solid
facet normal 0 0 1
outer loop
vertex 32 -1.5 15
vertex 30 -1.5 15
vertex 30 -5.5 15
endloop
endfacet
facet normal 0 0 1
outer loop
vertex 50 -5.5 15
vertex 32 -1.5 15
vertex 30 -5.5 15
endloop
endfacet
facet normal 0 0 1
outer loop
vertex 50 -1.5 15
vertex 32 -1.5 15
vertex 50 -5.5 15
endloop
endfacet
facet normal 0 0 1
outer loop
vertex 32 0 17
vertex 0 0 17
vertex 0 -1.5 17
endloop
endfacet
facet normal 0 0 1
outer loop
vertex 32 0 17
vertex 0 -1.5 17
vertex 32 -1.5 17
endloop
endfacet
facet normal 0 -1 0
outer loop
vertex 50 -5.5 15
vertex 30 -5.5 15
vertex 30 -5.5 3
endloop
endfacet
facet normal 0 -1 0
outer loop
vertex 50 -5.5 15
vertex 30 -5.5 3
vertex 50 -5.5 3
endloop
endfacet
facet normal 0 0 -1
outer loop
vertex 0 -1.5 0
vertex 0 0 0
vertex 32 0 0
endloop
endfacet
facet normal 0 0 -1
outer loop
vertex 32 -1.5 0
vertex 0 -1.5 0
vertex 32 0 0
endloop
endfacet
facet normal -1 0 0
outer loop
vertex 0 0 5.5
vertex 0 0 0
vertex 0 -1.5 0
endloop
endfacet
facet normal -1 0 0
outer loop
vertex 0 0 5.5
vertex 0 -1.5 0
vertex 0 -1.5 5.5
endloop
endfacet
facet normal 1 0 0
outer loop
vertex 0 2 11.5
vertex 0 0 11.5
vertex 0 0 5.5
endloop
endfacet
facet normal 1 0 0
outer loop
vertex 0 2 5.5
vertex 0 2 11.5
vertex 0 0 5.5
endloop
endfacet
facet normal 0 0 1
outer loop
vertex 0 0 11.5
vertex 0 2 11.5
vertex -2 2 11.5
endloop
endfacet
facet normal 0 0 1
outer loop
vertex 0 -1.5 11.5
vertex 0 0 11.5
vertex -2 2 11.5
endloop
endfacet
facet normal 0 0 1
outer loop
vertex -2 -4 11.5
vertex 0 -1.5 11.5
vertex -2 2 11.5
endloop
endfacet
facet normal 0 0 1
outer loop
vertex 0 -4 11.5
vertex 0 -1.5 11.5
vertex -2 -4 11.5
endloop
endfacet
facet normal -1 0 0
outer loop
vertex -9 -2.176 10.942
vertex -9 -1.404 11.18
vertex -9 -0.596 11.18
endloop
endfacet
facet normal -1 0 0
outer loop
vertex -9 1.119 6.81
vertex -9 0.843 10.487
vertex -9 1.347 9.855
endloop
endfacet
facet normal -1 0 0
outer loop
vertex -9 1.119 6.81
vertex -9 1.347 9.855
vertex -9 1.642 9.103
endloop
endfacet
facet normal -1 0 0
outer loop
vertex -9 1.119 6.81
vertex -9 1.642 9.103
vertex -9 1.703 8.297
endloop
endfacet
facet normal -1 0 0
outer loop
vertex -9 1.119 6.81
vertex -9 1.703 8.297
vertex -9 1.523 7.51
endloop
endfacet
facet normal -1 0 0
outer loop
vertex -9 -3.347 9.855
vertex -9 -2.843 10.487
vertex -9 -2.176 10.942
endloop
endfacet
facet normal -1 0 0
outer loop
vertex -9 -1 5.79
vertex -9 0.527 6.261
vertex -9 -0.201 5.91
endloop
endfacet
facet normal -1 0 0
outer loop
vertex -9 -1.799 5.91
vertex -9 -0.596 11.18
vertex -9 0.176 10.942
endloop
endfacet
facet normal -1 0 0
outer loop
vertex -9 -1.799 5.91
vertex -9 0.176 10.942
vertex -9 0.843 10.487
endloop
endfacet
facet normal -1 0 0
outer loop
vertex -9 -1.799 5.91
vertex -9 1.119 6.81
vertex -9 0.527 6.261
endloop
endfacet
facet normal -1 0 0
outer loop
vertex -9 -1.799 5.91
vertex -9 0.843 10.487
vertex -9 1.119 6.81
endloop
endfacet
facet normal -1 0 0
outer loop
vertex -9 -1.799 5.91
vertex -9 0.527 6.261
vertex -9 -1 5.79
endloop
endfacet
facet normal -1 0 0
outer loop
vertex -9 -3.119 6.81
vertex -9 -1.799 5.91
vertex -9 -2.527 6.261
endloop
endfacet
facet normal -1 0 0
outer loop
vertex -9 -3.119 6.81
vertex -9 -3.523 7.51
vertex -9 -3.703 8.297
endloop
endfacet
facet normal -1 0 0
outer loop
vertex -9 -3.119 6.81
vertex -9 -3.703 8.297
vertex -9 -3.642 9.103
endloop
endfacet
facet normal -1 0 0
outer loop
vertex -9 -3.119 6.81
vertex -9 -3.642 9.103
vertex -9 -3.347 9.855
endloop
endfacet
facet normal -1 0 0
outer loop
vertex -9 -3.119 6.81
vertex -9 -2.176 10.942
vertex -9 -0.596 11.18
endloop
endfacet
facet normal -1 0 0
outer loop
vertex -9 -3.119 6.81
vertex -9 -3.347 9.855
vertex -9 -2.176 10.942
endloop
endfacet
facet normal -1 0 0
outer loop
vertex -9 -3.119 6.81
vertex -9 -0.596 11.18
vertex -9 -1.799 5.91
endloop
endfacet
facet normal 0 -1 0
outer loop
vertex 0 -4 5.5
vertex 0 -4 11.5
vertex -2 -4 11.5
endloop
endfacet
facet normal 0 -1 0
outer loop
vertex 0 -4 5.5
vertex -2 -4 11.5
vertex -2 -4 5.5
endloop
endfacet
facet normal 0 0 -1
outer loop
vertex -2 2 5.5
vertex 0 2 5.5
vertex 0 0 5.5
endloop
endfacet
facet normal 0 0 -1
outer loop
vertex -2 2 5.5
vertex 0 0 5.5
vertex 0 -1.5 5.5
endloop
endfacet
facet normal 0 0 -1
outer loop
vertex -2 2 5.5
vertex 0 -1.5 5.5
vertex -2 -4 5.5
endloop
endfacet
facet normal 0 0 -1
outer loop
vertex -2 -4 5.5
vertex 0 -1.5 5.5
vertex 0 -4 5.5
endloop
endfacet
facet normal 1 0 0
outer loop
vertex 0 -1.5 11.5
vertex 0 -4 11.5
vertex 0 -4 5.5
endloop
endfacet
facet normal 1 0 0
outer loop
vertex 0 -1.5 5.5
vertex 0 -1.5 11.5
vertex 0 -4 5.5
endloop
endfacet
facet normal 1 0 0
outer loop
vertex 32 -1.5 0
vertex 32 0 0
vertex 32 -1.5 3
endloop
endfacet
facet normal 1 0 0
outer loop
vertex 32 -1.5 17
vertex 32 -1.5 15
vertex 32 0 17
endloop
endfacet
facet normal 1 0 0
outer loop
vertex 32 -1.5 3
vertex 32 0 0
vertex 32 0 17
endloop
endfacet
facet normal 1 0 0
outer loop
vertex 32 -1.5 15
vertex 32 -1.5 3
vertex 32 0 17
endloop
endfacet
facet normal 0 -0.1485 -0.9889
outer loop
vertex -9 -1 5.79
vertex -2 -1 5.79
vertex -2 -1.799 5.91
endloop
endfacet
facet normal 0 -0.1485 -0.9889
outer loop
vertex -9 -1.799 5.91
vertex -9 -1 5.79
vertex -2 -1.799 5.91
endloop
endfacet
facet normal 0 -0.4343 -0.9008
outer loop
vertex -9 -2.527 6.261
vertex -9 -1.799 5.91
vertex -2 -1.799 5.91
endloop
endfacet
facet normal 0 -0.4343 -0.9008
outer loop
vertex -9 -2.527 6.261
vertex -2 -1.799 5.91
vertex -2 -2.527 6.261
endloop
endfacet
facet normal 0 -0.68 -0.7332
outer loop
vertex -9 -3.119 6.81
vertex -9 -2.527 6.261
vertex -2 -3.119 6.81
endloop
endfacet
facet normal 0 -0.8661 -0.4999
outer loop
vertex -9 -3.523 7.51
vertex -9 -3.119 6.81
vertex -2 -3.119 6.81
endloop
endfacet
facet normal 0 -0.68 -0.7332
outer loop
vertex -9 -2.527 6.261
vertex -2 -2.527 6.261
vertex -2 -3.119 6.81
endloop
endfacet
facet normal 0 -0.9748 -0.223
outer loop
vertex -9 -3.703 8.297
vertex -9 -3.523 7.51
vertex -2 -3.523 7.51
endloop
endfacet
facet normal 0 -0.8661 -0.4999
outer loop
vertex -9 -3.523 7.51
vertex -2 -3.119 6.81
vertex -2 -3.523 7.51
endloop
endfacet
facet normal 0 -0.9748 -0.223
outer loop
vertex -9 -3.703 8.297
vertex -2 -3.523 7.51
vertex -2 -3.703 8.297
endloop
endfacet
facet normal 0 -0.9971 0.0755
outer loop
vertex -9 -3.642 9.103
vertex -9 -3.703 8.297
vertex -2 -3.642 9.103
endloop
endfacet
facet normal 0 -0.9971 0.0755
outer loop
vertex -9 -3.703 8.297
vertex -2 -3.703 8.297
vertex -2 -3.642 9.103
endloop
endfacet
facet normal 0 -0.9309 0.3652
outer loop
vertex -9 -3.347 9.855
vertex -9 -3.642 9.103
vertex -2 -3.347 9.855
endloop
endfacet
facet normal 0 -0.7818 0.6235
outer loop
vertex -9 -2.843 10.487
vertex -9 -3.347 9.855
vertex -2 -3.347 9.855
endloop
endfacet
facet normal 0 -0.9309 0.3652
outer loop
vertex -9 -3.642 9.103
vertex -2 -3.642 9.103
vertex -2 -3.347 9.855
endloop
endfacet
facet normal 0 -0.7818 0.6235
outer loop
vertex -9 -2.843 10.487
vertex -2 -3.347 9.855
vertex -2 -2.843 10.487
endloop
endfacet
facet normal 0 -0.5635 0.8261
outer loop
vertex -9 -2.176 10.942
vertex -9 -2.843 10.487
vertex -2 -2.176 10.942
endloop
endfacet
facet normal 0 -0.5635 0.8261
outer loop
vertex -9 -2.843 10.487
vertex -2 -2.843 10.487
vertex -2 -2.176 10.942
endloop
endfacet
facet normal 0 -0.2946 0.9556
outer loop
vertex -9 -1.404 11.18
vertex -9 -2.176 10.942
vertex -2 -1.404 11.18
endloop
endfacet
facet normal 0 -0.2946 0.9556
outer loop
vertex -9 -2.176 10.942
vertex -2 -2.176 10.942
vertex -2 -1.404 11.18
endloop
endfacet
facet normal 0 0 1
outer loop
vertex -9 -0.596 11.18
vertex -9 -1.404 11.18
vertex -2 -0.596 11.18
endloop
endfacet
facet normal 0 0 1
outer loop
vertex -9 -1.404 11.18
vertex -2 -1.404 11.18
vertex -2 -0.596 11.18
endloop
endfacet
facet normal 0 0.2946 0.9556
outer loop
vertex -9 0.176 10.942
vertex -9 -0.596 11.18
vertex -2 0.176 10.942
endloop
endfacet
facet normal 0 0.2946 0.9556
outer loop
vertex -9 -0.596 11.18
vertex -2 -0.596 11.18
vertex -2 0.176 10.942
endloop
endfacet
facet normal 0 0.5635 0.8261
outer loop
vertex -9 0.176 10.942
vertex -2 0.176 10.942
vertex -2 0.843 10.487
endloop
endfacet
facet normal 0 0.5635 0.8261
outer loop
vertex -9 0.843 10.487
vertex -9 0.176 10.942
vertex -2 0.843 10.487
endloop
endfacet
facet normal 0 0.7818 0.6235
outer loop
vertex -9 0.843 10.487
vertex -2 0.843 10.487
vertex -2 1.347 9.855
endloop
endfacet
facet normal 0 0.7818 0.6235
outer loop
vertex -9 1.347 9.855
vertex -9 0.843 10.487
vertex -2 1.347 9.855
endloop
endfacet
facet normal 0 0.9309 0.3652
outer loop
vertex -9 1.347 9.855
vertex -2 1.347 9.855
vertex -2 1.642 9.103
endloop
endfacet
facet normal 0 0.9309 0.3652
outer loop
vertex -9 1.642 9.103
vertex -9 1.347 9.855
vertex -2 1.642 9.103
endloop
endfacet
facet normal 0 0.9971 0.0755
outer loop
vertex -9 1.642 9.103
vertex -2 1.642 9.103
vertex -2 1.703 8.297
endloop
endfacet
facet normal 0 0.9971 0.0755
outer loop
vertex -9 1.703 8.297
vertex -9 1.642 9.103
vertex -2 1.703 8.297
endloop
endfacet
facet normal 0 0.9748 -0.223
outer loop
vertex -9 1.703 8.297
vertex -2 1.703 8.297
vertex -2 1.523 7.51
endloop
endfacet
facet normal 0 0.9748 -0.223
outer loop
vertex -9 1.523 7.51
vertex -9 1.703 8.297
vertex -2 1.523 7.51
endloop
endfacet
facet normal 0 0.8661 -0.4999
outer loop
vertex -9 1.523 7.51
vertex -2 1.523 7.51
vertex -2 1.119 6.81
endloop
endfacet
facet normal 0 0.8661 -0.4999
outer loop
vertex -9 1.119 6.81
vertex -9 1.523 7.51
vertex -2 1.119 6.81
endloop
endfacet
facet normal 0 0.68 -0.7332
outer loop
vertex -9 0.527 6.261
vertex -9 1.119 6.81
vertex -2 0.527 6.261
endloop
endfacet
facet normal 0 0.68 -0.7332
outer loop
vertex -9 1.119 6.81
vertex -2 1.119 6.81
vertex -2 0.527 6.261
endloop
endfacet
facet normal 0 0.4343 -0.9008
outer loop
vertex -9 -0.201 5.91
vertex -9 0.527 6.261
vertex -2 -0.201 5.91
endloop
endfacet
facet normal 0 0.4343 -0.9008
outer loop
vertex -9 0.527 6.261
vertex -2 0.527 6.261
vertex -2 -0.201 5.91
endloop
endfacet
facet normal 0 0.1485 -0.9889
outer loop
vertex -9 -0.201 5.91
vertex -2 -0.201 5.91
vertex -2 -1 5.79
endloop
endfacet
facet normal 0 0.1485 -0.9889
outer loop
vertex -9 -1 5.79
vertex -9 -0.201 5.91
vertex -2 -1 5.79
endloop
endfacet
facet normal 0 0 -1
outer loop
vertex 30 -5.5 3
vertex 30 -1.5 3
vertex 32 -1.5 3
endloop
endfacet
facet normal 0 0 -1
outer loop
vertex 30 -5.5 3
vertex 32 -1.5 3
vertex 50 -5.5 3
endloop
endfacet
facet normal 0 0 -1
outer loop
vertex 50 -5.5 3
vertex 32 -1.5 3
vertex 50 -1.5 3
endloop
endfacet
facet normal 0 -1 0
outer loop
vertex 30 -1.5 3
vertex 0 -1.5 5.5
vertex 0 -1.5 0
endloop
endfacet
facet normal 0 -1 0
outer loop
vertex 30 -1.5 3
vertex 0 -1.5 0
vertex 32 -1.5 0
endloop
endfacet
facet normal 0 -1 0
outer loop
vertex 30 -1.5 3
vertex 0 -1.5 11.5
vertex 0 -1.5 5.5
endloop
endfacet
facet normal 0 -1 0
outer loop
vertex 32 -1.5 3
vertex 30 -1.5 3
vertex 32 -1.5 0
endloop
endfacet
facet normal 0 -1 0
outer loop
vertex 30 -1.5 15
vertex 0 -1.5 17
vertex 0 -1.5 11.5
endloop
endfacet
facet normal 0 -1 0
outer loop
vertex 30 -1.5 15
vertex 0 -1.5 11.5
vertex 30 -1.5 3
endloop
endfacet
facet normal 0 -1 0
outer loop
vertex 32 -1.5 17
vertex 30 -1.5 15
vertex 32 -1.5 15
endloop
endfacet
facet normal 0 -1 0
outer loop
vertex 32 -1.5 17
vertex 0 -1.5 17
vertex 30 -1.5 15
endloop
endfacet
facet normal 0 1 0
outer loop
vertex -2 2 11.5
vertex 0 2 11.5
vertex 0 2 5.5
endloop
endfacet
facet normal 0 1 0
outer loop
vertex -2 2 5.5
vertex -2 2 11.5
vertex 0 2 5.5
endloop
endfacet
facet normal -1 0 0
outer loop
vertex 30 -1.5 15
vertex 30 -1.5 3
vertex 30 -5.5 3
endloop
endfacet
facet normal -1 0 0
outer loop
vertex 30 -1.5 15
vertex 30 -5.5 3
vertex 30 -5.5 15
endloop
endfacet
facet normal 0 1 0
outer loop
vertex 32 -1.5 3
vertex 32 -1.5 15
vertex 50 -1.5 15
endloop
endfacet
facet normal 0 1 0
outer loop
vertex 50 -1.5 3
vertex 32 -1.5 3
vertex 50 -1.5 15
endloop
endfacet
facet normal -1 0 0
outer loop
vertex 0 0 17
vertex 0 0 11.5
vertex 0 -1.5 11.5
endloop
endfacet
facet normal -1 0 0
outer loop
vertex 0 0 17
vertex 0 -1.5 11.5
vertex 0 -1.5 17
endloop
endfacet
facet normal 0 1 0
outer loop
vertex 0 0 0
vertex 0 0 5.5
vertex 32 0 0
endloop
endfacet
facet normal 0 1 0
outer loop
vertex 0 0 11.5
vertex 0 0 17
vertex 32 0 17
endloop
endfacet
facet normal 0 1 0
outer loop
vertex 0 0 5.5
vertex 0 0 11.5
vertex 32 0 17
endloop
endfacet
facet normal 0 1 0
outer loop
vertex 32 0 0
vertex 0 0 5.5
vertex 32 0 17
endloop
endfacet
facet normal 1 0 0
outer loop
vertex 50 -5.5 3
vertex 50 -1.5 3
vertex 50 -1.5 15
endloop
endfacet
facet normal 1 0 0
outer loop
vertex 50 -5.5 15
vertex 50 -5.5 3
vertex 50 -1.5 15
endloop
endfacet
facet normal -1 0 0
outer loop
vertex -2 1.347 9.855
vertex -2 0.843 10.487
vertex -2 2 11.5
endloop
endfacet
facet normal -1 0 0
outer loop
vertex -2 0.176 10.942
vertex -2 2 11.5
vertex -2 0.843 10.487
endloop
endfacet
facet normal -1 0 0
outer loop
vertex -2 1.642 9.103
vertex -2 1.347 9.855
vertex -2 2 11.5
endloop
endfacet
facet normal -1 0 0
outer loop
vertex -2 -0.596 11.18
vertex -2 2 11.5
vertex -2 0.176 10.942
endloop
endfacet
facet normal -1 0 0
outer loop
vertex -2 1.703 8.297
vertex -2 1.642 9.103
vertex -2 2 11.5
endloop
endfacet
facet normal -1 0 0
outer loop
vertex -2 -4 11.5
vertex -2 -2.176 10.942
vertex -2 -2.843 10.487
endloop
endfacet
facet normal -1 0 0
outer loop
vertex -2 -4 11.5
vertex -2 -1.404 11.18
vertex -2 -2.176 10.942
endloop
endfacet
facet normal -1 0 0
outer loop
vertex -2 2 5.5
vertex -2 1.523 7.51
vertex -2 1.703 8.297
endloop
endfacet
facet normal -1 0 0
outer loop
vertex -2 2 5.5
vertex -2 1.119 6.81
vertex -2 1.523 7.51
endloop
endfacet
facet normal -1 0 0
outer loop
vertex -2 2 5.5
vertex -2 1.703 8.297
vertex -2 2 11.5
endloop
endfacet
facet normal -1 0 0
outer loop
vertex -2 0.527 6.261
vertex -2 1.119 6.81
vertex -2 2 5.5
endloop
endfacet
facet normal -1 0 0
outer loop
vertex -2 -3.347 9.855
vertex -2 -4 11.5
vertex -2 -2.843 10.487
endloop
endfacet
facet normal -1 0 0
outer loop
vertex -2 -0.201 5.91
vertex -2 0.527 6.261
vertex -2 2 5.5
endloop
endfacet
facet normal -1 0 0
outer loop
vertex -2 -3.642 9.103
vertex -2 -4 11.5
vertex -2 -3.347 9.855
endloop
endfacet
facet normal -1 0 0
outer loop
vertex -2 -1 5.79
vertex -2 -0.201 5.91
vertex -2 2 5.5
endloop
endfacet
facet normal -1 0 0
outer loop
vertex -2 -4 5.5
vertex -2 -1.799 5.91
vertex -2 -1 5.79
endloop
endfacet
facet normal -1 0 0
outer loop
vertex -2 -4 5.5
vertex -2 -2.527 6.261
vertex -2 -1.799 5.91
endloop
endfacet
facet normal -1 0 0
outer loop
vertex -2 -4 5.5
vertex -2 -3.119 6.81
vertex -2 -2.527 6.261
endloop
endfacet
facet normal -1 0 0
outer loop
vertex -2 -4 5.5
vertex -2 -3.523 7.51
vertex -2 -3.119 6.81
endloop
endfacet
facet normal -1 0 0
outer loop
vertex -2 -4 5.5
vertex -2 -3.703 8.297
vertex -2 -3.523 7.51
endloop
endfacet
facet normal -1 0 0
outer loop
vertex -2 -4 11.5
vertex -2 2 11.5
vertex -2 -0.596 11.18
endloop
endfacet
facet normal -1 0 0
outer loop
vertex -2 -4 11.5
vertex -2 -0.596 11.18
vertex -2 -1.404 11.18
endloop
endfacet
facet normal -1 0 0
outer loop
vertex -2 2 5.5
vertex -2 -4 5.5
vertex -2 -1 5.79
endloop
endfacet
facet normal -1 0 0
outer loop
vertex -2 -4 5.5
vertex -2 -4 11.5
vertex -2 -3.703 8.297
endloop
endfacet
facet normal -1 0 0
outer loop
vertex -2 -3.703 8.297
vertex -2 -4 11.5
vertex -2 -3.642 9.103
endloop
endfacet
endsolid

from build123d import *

# Parameters (mm, degrees)
SKETCH_W     = 32
SKETCH_H     = 17
PAD_DEPTH    = 1.5
SKETCH001_W  = 6
SKETCH001_H  = 6
PAD001_DEPTH = 2
SKETCH002_R  = 2.710161
PAD002_DEPTH = 7
SKETCH003_W  = 20
SKETCH003_H  = 12
PAD003_DEPTH = 4


with BuildPart() as part:
    # Sketch → Pad (new body)
    with BuildSketch(Plane.XZ):
        with Locations((16, 8.5)):
            Rectangle(SKETCH_W, SKETCH_H)
    extrude(amount=PAD_DEPTH)

    # Sketch001 (on Face4 of Pad) → Pad001 (join)
    with BuildSketch(Plane(origin=(0, 0, 0), x_dir=(0, 0, -1), z_dir=(-1, 0, 0))):
        with Locations((-8.5, 1)):
            Rectangle(SKETCH001_W, SKETCH001_H)
    extrude(amount=PAD001_DEPTH)

    # Sketch002 (on Face13 of Pad001) → Pad002 (join)
    with BuildSketch(Plane(origin=(-2, 0, 0), x_dir=(0, 0, -1), z_dir=(-1, 0, 0))):
        with Locations((-8.5, 1)):
            Circle(SKETCH002_R)
    extrude(amount=PAD002_DEPTH)

    # Sketch003 (on Face5 of Pad002) → Pad003 (join)
    with BuildSketch(Plane.XZ.offset(1.5)):
        with Locations((40, 9)):
            Rectangle(SKETCH003_W, SKETCH003_H)
    extrude(amount=PAD003_DEPTH)


solid = part.part
